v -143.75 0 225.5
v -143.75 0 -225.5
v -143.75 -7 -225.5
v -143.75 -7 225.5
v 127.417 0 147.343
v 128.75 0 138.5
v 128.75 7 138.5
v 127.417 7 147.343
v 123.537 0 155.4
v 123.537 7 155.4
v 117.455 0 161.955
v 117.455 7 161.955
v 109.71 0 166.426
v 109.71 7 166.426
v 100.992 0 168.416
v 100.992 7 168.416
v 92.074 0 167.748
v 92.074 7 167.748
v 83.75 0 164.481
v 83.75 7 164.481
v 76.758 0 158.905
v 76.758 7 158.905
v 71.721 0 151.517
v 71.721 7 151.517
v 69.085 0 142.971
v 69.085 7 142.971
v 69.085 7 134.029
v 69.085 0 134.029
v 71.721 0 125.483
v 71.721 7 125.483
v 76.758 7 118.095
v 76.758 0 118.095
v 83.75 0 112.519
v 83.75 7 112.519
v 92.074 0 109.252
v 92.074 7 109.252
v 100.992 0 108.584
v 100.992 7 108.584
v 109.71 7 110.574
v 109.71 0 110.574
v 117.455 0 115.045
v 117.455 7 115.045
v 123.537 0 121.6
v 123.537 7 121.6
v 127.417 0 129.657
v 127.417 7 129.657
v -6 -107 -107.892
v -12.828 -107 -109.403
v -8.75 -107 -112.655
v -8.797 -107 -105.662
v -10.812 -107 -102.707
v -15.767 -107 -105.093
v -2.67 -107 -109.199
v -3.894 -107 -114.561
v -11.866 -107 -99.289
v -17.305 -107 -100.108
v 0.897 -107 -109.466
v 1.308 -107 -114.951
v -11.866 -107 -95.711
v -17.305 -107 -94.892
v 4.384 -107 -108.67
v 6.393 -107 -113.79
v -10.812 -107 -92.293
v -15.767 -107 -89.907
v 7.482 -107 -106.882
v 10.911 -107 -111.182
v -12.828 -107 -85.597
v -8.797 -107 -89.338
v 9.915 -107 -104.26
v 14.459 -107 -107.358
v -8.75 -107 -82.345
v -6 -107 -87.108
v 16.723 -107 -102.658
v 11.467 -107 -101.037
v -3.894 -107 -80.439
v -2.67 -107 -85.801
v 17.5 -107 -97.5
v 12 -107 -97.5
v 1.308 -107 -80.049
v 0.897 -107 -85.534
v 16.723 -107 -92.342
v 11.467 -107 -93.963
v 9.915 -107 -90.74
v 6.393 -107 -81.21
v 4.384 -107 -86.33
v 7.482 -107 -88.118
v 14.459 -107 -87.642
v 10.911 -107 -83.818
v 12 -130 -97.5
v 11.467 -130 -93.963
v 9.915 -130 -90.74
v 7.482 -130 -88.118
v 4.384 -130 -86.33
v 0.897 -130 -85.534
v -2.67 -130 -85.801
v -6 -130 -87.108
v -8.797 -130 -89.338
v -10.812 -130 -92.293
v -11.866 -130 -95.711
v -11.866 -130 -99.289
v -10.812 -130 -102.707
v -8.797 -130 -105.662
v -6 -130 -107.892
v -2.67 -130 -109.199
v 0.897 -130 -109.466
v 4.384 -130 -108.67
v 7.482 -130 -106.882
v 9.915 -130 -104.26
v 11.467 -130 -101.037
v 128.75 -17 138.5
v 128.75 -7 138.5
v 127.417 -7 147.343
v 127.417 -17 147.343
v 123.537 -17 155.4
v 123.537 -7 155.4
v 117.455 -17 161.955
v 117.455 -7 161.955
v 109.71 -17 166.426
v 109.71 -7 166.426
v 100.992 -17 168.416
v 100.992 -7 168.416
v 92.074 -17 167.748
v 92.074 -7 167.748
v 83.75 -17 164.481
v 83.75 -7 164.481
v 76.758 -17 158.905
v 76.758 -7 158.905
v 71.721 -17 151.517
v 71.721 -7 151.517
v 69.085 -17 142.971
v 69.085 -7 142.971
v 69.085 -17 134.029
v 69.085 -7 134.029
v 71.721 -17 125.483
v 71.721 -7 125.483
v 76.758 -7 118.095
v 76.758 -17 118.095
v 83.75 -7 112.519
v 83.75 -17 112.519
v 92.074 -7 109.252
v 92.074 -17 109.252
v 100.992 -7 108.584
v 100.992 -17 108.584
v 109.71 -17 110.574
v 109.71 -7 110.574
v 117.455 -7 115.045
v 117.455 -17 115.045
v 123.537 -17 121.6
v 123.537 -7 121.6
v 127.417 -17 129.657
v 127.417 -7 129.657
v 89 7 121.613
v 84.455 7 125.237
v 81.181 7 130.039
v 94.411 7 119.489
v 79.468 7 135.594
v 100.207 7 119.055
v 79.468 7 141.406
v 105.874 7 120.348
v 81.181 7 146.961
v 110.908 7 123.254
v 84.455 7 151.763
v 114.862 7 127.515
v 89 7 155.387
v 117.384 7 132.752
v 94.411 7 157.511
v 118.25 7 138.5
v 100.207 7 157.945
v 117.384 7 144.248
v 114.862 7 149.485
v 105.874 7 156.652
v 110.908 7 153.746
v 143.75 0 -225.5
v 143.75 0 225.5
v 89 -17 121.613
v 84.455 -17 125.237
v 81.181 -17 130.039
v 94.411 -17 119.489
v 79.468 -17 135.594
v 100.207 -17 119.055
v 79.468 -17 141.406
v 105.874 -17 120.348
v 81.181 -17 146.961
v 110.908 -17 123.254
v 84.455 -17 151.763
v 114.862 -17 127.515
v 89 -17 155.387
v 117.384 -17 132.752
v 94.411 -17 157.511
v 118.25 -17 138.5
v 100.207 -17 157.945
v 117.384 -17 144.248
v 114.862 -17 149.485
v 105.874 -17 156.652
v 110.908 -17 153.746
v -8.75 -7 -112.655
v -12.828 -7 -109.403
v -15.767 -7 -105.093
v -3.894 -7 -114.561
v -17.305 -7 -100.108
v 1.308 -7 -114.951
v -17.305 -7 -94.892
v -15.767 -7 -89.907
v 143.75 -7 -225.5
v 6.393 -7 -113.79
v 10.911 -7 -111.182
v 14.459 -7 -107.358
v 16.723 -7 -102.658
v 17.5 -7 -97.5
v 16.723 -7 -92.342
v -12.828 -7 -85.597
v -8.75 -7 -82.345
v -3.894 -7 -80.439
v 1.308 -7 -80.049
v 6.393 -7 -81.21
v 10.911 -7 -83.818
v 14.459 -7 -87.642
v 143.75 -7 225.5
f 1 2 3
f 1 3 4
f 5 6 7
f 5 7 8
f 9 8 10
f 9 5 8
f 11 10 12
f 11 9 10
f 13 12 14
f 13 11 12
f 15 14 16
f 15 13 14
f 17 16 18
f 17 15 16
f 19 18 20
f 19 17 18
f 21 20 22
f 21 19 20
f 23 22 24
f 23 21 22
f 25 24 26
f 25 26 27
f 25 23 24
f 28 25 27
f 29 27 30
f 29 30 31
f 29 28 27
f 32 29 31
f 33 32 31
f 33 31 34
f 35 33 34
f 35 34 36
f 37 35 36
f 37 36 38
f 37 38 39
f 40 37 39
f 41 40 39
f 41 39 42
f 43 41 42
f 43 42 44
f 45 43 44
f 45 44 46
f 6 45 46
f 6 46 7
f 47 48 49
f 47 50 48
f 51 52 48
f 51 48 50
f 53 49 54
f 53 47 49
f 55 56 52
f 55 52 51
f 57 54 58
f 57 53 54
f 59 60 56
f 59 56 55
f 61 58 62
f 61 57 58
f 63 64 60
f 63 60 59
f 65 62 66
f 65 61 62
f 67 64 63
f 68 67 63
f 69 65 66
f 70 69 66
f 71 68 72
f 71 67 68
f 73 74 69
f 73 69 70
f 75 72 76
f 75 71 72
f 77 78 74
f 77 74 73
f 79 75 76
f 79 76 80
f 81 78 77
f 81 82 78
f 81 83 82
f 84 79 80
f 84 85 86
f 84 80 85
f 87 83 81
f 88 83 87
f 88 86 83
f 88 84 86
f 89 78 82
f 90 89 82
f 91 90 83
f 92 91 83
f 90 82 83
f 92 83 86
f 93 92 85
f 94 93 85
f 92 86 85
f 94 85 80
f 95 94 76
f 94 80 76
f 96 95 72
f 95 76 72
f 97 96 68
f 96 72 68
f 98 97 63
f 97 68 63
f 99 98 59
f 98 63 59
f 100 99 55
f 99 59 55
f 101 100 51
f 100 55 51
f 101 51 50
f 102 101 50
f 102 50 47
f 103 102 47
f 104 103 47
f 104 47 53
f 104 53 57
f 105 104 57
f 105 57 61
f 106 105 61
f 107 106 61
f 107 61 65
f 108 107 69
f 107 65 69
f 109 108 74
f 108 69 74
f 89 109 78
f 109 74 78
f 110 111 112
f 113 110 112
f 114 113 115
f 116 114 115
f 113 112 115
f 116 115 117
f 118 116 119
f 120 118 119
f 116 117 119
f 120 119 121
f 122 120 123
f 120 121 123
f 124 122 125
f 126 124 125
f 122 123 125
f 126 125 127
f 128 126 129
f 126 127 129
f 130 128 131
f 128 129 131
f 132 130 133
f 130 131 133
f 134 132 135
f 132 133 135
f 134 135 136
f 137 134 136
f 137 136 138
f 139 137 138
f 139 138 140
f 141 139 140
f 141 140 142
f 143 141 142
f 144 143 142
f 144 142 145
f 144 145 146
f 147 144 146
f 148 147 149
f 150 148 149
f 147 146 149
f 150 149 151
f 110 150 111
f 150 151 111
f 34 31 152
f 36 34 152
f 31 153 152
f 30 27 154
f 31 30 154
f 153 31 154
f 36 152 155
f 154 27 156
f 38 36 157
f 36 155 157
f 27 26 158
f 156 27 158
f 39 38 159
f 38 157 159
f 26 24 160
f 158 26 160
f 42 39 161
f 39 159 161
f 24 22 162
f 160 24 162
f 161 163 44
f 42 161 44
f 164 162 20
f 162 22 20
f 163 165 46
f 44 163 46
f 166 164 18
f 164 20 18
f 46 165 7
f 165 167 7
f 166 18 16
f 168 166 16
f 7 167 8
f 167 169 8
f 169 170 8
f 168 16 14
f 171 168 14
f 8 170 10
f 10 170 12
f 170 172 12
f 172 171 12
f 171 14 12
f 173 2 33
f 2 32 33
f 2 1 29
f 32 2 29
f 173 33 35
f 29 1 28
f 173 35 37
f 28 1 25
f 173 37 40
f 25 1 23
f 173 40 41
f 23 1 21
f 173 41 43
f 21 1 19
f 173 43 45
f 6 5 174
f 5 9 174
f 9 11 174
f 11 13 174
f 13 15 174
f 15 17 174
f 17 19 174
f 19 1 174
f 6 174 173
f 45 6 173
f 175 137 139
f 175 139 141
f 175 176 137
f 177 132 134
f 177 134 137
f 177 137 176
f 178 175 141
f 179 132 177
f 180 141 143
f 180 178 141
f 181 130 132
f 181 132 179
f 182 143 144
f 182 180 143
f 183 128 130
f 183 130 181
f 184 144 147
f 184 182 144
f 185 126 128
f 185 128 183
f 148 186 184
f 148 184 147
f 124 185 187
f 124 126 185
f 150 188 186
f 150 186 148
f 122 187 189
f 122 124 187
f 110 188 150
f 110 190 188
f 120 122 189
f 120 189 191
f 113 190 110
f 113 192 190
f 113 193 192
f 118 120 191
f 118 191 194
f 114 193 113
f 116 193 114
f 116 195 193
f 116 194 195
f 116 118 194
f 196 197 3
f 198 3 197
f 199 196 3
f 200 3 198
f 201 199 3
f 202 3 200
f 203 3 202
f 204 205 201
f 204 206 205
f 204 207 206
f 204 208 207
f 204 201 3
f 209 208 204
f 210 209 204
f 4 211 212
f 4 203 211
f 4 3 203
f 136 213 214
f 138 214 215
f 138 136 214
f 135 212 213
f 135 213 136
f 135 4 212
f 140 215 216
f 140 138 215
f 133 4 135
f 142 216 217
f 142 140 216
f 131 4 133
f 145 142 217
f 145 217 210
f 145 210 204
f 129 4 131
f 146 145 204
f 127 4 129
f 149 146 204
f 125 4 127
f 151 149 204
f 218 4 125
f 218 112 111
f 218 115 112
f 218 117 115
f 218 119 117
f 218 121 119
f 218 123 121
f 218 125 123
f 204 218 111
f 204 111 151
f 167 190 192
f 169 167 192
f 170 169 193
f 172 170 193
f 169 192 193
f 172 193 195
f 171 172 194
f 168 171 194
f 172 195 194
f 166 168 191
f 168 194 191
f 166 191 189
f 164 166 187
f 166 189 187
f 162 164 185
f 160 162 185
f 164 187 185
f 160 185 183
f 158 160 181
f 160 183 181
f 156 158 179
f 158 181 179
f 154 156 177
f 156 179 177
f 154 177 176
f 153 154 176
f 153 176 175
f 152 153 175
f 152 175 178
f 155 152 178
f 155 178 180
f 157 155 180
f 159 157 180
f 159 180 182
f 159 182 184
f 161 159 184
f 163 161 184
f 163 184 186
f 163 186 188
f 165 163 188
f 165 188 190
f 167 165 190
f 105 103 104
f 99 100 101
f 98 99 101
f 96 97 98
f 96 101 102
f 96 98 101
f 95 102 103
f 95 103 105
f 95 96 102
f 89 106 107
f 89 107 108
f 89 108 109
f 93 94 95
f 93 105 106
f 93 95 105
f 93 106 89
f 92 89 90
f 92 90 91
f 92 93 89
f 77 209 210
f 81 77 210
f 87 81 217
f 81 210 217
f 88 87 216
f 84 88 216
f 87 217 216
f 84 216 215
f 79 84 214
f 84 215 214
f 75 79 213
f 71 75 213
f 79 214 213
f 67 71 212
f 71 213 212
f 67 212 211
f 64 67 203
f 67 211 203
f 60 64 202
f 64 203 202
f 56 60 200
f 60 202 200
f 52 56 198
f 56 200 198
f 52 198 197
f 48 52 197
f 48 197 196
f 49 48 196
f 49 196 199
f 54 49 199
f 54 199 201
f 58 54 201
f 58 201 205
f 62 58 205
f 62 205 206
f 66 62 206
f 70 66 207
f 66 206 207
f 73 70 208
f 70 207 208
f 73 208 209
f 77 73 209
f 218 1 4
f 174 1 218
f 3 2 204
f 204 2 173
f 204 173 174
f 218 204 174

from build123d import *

# Parameters (mm, degrees)
F0_W     = 287.5
F0_H     = 451
F1_DEPTH = 7
F2_R     = 30
F2_R_2   = 19.5
F3_DEPTH = 10
F4_DEPTH = 25
F5_DEPTH = 24
F2_R_3   = 17.5
F6_DEPTH = 100
F7_R     = 12
F8_DEPTH = 23


with BuildPart() as f1:
    # F0 (on Front) → F1 (new body)
    with BuildSketch(Plane.XZ):
        Rectangle(F0_W, F0_H)
    extrude(amount=F1_DEPTH)

    # F2 (on face) → F3 (join)
    with BuildSketch(Plane.XZ.offset(7)):
        with Locations((98.75, 138.5)):
            Circle(F2_R)
        with Locations((98.75, 138.5)):
            Circle(F2_R_2, mode=Mode.SUBTRACT)
    extrude(amount=F3_DEPTH)

    # F4 (cut): a face of the model
    f4_faces = [f1.faces().sort_by_distance(p)[0] for p in [
        (98.75, -7, 138.5),
    ]]
    extrude(f4_faces, amount=-F4_DEPTH, mode=Mode.SUBTRACT)

    # F5 (add): a face of the model
    f5_faces = [f1.faces().sort_by_distance(p)[0] for p in [
        (69.5985281374, -17, 138.5),
    ]]
    extrude(f5_faces, amount=-F5_DEPTH)

    # F2 (on face) → F6 (join)
    with BuildSketch(Plane.XZ.offset(7)):
        with Locations((0, -97.5)):
            Circle(F2_R_3)
    extrude(amount=F6_DEPTH)

    # F7 (on face) → F8 (join)
    with BuildSketch(Plane.XZ.offset(107)):
        with Locations((0, -97.5)):
            Circle(F7_R)
    extrude(amount=F8_DEPTH)


solid = f1.part
